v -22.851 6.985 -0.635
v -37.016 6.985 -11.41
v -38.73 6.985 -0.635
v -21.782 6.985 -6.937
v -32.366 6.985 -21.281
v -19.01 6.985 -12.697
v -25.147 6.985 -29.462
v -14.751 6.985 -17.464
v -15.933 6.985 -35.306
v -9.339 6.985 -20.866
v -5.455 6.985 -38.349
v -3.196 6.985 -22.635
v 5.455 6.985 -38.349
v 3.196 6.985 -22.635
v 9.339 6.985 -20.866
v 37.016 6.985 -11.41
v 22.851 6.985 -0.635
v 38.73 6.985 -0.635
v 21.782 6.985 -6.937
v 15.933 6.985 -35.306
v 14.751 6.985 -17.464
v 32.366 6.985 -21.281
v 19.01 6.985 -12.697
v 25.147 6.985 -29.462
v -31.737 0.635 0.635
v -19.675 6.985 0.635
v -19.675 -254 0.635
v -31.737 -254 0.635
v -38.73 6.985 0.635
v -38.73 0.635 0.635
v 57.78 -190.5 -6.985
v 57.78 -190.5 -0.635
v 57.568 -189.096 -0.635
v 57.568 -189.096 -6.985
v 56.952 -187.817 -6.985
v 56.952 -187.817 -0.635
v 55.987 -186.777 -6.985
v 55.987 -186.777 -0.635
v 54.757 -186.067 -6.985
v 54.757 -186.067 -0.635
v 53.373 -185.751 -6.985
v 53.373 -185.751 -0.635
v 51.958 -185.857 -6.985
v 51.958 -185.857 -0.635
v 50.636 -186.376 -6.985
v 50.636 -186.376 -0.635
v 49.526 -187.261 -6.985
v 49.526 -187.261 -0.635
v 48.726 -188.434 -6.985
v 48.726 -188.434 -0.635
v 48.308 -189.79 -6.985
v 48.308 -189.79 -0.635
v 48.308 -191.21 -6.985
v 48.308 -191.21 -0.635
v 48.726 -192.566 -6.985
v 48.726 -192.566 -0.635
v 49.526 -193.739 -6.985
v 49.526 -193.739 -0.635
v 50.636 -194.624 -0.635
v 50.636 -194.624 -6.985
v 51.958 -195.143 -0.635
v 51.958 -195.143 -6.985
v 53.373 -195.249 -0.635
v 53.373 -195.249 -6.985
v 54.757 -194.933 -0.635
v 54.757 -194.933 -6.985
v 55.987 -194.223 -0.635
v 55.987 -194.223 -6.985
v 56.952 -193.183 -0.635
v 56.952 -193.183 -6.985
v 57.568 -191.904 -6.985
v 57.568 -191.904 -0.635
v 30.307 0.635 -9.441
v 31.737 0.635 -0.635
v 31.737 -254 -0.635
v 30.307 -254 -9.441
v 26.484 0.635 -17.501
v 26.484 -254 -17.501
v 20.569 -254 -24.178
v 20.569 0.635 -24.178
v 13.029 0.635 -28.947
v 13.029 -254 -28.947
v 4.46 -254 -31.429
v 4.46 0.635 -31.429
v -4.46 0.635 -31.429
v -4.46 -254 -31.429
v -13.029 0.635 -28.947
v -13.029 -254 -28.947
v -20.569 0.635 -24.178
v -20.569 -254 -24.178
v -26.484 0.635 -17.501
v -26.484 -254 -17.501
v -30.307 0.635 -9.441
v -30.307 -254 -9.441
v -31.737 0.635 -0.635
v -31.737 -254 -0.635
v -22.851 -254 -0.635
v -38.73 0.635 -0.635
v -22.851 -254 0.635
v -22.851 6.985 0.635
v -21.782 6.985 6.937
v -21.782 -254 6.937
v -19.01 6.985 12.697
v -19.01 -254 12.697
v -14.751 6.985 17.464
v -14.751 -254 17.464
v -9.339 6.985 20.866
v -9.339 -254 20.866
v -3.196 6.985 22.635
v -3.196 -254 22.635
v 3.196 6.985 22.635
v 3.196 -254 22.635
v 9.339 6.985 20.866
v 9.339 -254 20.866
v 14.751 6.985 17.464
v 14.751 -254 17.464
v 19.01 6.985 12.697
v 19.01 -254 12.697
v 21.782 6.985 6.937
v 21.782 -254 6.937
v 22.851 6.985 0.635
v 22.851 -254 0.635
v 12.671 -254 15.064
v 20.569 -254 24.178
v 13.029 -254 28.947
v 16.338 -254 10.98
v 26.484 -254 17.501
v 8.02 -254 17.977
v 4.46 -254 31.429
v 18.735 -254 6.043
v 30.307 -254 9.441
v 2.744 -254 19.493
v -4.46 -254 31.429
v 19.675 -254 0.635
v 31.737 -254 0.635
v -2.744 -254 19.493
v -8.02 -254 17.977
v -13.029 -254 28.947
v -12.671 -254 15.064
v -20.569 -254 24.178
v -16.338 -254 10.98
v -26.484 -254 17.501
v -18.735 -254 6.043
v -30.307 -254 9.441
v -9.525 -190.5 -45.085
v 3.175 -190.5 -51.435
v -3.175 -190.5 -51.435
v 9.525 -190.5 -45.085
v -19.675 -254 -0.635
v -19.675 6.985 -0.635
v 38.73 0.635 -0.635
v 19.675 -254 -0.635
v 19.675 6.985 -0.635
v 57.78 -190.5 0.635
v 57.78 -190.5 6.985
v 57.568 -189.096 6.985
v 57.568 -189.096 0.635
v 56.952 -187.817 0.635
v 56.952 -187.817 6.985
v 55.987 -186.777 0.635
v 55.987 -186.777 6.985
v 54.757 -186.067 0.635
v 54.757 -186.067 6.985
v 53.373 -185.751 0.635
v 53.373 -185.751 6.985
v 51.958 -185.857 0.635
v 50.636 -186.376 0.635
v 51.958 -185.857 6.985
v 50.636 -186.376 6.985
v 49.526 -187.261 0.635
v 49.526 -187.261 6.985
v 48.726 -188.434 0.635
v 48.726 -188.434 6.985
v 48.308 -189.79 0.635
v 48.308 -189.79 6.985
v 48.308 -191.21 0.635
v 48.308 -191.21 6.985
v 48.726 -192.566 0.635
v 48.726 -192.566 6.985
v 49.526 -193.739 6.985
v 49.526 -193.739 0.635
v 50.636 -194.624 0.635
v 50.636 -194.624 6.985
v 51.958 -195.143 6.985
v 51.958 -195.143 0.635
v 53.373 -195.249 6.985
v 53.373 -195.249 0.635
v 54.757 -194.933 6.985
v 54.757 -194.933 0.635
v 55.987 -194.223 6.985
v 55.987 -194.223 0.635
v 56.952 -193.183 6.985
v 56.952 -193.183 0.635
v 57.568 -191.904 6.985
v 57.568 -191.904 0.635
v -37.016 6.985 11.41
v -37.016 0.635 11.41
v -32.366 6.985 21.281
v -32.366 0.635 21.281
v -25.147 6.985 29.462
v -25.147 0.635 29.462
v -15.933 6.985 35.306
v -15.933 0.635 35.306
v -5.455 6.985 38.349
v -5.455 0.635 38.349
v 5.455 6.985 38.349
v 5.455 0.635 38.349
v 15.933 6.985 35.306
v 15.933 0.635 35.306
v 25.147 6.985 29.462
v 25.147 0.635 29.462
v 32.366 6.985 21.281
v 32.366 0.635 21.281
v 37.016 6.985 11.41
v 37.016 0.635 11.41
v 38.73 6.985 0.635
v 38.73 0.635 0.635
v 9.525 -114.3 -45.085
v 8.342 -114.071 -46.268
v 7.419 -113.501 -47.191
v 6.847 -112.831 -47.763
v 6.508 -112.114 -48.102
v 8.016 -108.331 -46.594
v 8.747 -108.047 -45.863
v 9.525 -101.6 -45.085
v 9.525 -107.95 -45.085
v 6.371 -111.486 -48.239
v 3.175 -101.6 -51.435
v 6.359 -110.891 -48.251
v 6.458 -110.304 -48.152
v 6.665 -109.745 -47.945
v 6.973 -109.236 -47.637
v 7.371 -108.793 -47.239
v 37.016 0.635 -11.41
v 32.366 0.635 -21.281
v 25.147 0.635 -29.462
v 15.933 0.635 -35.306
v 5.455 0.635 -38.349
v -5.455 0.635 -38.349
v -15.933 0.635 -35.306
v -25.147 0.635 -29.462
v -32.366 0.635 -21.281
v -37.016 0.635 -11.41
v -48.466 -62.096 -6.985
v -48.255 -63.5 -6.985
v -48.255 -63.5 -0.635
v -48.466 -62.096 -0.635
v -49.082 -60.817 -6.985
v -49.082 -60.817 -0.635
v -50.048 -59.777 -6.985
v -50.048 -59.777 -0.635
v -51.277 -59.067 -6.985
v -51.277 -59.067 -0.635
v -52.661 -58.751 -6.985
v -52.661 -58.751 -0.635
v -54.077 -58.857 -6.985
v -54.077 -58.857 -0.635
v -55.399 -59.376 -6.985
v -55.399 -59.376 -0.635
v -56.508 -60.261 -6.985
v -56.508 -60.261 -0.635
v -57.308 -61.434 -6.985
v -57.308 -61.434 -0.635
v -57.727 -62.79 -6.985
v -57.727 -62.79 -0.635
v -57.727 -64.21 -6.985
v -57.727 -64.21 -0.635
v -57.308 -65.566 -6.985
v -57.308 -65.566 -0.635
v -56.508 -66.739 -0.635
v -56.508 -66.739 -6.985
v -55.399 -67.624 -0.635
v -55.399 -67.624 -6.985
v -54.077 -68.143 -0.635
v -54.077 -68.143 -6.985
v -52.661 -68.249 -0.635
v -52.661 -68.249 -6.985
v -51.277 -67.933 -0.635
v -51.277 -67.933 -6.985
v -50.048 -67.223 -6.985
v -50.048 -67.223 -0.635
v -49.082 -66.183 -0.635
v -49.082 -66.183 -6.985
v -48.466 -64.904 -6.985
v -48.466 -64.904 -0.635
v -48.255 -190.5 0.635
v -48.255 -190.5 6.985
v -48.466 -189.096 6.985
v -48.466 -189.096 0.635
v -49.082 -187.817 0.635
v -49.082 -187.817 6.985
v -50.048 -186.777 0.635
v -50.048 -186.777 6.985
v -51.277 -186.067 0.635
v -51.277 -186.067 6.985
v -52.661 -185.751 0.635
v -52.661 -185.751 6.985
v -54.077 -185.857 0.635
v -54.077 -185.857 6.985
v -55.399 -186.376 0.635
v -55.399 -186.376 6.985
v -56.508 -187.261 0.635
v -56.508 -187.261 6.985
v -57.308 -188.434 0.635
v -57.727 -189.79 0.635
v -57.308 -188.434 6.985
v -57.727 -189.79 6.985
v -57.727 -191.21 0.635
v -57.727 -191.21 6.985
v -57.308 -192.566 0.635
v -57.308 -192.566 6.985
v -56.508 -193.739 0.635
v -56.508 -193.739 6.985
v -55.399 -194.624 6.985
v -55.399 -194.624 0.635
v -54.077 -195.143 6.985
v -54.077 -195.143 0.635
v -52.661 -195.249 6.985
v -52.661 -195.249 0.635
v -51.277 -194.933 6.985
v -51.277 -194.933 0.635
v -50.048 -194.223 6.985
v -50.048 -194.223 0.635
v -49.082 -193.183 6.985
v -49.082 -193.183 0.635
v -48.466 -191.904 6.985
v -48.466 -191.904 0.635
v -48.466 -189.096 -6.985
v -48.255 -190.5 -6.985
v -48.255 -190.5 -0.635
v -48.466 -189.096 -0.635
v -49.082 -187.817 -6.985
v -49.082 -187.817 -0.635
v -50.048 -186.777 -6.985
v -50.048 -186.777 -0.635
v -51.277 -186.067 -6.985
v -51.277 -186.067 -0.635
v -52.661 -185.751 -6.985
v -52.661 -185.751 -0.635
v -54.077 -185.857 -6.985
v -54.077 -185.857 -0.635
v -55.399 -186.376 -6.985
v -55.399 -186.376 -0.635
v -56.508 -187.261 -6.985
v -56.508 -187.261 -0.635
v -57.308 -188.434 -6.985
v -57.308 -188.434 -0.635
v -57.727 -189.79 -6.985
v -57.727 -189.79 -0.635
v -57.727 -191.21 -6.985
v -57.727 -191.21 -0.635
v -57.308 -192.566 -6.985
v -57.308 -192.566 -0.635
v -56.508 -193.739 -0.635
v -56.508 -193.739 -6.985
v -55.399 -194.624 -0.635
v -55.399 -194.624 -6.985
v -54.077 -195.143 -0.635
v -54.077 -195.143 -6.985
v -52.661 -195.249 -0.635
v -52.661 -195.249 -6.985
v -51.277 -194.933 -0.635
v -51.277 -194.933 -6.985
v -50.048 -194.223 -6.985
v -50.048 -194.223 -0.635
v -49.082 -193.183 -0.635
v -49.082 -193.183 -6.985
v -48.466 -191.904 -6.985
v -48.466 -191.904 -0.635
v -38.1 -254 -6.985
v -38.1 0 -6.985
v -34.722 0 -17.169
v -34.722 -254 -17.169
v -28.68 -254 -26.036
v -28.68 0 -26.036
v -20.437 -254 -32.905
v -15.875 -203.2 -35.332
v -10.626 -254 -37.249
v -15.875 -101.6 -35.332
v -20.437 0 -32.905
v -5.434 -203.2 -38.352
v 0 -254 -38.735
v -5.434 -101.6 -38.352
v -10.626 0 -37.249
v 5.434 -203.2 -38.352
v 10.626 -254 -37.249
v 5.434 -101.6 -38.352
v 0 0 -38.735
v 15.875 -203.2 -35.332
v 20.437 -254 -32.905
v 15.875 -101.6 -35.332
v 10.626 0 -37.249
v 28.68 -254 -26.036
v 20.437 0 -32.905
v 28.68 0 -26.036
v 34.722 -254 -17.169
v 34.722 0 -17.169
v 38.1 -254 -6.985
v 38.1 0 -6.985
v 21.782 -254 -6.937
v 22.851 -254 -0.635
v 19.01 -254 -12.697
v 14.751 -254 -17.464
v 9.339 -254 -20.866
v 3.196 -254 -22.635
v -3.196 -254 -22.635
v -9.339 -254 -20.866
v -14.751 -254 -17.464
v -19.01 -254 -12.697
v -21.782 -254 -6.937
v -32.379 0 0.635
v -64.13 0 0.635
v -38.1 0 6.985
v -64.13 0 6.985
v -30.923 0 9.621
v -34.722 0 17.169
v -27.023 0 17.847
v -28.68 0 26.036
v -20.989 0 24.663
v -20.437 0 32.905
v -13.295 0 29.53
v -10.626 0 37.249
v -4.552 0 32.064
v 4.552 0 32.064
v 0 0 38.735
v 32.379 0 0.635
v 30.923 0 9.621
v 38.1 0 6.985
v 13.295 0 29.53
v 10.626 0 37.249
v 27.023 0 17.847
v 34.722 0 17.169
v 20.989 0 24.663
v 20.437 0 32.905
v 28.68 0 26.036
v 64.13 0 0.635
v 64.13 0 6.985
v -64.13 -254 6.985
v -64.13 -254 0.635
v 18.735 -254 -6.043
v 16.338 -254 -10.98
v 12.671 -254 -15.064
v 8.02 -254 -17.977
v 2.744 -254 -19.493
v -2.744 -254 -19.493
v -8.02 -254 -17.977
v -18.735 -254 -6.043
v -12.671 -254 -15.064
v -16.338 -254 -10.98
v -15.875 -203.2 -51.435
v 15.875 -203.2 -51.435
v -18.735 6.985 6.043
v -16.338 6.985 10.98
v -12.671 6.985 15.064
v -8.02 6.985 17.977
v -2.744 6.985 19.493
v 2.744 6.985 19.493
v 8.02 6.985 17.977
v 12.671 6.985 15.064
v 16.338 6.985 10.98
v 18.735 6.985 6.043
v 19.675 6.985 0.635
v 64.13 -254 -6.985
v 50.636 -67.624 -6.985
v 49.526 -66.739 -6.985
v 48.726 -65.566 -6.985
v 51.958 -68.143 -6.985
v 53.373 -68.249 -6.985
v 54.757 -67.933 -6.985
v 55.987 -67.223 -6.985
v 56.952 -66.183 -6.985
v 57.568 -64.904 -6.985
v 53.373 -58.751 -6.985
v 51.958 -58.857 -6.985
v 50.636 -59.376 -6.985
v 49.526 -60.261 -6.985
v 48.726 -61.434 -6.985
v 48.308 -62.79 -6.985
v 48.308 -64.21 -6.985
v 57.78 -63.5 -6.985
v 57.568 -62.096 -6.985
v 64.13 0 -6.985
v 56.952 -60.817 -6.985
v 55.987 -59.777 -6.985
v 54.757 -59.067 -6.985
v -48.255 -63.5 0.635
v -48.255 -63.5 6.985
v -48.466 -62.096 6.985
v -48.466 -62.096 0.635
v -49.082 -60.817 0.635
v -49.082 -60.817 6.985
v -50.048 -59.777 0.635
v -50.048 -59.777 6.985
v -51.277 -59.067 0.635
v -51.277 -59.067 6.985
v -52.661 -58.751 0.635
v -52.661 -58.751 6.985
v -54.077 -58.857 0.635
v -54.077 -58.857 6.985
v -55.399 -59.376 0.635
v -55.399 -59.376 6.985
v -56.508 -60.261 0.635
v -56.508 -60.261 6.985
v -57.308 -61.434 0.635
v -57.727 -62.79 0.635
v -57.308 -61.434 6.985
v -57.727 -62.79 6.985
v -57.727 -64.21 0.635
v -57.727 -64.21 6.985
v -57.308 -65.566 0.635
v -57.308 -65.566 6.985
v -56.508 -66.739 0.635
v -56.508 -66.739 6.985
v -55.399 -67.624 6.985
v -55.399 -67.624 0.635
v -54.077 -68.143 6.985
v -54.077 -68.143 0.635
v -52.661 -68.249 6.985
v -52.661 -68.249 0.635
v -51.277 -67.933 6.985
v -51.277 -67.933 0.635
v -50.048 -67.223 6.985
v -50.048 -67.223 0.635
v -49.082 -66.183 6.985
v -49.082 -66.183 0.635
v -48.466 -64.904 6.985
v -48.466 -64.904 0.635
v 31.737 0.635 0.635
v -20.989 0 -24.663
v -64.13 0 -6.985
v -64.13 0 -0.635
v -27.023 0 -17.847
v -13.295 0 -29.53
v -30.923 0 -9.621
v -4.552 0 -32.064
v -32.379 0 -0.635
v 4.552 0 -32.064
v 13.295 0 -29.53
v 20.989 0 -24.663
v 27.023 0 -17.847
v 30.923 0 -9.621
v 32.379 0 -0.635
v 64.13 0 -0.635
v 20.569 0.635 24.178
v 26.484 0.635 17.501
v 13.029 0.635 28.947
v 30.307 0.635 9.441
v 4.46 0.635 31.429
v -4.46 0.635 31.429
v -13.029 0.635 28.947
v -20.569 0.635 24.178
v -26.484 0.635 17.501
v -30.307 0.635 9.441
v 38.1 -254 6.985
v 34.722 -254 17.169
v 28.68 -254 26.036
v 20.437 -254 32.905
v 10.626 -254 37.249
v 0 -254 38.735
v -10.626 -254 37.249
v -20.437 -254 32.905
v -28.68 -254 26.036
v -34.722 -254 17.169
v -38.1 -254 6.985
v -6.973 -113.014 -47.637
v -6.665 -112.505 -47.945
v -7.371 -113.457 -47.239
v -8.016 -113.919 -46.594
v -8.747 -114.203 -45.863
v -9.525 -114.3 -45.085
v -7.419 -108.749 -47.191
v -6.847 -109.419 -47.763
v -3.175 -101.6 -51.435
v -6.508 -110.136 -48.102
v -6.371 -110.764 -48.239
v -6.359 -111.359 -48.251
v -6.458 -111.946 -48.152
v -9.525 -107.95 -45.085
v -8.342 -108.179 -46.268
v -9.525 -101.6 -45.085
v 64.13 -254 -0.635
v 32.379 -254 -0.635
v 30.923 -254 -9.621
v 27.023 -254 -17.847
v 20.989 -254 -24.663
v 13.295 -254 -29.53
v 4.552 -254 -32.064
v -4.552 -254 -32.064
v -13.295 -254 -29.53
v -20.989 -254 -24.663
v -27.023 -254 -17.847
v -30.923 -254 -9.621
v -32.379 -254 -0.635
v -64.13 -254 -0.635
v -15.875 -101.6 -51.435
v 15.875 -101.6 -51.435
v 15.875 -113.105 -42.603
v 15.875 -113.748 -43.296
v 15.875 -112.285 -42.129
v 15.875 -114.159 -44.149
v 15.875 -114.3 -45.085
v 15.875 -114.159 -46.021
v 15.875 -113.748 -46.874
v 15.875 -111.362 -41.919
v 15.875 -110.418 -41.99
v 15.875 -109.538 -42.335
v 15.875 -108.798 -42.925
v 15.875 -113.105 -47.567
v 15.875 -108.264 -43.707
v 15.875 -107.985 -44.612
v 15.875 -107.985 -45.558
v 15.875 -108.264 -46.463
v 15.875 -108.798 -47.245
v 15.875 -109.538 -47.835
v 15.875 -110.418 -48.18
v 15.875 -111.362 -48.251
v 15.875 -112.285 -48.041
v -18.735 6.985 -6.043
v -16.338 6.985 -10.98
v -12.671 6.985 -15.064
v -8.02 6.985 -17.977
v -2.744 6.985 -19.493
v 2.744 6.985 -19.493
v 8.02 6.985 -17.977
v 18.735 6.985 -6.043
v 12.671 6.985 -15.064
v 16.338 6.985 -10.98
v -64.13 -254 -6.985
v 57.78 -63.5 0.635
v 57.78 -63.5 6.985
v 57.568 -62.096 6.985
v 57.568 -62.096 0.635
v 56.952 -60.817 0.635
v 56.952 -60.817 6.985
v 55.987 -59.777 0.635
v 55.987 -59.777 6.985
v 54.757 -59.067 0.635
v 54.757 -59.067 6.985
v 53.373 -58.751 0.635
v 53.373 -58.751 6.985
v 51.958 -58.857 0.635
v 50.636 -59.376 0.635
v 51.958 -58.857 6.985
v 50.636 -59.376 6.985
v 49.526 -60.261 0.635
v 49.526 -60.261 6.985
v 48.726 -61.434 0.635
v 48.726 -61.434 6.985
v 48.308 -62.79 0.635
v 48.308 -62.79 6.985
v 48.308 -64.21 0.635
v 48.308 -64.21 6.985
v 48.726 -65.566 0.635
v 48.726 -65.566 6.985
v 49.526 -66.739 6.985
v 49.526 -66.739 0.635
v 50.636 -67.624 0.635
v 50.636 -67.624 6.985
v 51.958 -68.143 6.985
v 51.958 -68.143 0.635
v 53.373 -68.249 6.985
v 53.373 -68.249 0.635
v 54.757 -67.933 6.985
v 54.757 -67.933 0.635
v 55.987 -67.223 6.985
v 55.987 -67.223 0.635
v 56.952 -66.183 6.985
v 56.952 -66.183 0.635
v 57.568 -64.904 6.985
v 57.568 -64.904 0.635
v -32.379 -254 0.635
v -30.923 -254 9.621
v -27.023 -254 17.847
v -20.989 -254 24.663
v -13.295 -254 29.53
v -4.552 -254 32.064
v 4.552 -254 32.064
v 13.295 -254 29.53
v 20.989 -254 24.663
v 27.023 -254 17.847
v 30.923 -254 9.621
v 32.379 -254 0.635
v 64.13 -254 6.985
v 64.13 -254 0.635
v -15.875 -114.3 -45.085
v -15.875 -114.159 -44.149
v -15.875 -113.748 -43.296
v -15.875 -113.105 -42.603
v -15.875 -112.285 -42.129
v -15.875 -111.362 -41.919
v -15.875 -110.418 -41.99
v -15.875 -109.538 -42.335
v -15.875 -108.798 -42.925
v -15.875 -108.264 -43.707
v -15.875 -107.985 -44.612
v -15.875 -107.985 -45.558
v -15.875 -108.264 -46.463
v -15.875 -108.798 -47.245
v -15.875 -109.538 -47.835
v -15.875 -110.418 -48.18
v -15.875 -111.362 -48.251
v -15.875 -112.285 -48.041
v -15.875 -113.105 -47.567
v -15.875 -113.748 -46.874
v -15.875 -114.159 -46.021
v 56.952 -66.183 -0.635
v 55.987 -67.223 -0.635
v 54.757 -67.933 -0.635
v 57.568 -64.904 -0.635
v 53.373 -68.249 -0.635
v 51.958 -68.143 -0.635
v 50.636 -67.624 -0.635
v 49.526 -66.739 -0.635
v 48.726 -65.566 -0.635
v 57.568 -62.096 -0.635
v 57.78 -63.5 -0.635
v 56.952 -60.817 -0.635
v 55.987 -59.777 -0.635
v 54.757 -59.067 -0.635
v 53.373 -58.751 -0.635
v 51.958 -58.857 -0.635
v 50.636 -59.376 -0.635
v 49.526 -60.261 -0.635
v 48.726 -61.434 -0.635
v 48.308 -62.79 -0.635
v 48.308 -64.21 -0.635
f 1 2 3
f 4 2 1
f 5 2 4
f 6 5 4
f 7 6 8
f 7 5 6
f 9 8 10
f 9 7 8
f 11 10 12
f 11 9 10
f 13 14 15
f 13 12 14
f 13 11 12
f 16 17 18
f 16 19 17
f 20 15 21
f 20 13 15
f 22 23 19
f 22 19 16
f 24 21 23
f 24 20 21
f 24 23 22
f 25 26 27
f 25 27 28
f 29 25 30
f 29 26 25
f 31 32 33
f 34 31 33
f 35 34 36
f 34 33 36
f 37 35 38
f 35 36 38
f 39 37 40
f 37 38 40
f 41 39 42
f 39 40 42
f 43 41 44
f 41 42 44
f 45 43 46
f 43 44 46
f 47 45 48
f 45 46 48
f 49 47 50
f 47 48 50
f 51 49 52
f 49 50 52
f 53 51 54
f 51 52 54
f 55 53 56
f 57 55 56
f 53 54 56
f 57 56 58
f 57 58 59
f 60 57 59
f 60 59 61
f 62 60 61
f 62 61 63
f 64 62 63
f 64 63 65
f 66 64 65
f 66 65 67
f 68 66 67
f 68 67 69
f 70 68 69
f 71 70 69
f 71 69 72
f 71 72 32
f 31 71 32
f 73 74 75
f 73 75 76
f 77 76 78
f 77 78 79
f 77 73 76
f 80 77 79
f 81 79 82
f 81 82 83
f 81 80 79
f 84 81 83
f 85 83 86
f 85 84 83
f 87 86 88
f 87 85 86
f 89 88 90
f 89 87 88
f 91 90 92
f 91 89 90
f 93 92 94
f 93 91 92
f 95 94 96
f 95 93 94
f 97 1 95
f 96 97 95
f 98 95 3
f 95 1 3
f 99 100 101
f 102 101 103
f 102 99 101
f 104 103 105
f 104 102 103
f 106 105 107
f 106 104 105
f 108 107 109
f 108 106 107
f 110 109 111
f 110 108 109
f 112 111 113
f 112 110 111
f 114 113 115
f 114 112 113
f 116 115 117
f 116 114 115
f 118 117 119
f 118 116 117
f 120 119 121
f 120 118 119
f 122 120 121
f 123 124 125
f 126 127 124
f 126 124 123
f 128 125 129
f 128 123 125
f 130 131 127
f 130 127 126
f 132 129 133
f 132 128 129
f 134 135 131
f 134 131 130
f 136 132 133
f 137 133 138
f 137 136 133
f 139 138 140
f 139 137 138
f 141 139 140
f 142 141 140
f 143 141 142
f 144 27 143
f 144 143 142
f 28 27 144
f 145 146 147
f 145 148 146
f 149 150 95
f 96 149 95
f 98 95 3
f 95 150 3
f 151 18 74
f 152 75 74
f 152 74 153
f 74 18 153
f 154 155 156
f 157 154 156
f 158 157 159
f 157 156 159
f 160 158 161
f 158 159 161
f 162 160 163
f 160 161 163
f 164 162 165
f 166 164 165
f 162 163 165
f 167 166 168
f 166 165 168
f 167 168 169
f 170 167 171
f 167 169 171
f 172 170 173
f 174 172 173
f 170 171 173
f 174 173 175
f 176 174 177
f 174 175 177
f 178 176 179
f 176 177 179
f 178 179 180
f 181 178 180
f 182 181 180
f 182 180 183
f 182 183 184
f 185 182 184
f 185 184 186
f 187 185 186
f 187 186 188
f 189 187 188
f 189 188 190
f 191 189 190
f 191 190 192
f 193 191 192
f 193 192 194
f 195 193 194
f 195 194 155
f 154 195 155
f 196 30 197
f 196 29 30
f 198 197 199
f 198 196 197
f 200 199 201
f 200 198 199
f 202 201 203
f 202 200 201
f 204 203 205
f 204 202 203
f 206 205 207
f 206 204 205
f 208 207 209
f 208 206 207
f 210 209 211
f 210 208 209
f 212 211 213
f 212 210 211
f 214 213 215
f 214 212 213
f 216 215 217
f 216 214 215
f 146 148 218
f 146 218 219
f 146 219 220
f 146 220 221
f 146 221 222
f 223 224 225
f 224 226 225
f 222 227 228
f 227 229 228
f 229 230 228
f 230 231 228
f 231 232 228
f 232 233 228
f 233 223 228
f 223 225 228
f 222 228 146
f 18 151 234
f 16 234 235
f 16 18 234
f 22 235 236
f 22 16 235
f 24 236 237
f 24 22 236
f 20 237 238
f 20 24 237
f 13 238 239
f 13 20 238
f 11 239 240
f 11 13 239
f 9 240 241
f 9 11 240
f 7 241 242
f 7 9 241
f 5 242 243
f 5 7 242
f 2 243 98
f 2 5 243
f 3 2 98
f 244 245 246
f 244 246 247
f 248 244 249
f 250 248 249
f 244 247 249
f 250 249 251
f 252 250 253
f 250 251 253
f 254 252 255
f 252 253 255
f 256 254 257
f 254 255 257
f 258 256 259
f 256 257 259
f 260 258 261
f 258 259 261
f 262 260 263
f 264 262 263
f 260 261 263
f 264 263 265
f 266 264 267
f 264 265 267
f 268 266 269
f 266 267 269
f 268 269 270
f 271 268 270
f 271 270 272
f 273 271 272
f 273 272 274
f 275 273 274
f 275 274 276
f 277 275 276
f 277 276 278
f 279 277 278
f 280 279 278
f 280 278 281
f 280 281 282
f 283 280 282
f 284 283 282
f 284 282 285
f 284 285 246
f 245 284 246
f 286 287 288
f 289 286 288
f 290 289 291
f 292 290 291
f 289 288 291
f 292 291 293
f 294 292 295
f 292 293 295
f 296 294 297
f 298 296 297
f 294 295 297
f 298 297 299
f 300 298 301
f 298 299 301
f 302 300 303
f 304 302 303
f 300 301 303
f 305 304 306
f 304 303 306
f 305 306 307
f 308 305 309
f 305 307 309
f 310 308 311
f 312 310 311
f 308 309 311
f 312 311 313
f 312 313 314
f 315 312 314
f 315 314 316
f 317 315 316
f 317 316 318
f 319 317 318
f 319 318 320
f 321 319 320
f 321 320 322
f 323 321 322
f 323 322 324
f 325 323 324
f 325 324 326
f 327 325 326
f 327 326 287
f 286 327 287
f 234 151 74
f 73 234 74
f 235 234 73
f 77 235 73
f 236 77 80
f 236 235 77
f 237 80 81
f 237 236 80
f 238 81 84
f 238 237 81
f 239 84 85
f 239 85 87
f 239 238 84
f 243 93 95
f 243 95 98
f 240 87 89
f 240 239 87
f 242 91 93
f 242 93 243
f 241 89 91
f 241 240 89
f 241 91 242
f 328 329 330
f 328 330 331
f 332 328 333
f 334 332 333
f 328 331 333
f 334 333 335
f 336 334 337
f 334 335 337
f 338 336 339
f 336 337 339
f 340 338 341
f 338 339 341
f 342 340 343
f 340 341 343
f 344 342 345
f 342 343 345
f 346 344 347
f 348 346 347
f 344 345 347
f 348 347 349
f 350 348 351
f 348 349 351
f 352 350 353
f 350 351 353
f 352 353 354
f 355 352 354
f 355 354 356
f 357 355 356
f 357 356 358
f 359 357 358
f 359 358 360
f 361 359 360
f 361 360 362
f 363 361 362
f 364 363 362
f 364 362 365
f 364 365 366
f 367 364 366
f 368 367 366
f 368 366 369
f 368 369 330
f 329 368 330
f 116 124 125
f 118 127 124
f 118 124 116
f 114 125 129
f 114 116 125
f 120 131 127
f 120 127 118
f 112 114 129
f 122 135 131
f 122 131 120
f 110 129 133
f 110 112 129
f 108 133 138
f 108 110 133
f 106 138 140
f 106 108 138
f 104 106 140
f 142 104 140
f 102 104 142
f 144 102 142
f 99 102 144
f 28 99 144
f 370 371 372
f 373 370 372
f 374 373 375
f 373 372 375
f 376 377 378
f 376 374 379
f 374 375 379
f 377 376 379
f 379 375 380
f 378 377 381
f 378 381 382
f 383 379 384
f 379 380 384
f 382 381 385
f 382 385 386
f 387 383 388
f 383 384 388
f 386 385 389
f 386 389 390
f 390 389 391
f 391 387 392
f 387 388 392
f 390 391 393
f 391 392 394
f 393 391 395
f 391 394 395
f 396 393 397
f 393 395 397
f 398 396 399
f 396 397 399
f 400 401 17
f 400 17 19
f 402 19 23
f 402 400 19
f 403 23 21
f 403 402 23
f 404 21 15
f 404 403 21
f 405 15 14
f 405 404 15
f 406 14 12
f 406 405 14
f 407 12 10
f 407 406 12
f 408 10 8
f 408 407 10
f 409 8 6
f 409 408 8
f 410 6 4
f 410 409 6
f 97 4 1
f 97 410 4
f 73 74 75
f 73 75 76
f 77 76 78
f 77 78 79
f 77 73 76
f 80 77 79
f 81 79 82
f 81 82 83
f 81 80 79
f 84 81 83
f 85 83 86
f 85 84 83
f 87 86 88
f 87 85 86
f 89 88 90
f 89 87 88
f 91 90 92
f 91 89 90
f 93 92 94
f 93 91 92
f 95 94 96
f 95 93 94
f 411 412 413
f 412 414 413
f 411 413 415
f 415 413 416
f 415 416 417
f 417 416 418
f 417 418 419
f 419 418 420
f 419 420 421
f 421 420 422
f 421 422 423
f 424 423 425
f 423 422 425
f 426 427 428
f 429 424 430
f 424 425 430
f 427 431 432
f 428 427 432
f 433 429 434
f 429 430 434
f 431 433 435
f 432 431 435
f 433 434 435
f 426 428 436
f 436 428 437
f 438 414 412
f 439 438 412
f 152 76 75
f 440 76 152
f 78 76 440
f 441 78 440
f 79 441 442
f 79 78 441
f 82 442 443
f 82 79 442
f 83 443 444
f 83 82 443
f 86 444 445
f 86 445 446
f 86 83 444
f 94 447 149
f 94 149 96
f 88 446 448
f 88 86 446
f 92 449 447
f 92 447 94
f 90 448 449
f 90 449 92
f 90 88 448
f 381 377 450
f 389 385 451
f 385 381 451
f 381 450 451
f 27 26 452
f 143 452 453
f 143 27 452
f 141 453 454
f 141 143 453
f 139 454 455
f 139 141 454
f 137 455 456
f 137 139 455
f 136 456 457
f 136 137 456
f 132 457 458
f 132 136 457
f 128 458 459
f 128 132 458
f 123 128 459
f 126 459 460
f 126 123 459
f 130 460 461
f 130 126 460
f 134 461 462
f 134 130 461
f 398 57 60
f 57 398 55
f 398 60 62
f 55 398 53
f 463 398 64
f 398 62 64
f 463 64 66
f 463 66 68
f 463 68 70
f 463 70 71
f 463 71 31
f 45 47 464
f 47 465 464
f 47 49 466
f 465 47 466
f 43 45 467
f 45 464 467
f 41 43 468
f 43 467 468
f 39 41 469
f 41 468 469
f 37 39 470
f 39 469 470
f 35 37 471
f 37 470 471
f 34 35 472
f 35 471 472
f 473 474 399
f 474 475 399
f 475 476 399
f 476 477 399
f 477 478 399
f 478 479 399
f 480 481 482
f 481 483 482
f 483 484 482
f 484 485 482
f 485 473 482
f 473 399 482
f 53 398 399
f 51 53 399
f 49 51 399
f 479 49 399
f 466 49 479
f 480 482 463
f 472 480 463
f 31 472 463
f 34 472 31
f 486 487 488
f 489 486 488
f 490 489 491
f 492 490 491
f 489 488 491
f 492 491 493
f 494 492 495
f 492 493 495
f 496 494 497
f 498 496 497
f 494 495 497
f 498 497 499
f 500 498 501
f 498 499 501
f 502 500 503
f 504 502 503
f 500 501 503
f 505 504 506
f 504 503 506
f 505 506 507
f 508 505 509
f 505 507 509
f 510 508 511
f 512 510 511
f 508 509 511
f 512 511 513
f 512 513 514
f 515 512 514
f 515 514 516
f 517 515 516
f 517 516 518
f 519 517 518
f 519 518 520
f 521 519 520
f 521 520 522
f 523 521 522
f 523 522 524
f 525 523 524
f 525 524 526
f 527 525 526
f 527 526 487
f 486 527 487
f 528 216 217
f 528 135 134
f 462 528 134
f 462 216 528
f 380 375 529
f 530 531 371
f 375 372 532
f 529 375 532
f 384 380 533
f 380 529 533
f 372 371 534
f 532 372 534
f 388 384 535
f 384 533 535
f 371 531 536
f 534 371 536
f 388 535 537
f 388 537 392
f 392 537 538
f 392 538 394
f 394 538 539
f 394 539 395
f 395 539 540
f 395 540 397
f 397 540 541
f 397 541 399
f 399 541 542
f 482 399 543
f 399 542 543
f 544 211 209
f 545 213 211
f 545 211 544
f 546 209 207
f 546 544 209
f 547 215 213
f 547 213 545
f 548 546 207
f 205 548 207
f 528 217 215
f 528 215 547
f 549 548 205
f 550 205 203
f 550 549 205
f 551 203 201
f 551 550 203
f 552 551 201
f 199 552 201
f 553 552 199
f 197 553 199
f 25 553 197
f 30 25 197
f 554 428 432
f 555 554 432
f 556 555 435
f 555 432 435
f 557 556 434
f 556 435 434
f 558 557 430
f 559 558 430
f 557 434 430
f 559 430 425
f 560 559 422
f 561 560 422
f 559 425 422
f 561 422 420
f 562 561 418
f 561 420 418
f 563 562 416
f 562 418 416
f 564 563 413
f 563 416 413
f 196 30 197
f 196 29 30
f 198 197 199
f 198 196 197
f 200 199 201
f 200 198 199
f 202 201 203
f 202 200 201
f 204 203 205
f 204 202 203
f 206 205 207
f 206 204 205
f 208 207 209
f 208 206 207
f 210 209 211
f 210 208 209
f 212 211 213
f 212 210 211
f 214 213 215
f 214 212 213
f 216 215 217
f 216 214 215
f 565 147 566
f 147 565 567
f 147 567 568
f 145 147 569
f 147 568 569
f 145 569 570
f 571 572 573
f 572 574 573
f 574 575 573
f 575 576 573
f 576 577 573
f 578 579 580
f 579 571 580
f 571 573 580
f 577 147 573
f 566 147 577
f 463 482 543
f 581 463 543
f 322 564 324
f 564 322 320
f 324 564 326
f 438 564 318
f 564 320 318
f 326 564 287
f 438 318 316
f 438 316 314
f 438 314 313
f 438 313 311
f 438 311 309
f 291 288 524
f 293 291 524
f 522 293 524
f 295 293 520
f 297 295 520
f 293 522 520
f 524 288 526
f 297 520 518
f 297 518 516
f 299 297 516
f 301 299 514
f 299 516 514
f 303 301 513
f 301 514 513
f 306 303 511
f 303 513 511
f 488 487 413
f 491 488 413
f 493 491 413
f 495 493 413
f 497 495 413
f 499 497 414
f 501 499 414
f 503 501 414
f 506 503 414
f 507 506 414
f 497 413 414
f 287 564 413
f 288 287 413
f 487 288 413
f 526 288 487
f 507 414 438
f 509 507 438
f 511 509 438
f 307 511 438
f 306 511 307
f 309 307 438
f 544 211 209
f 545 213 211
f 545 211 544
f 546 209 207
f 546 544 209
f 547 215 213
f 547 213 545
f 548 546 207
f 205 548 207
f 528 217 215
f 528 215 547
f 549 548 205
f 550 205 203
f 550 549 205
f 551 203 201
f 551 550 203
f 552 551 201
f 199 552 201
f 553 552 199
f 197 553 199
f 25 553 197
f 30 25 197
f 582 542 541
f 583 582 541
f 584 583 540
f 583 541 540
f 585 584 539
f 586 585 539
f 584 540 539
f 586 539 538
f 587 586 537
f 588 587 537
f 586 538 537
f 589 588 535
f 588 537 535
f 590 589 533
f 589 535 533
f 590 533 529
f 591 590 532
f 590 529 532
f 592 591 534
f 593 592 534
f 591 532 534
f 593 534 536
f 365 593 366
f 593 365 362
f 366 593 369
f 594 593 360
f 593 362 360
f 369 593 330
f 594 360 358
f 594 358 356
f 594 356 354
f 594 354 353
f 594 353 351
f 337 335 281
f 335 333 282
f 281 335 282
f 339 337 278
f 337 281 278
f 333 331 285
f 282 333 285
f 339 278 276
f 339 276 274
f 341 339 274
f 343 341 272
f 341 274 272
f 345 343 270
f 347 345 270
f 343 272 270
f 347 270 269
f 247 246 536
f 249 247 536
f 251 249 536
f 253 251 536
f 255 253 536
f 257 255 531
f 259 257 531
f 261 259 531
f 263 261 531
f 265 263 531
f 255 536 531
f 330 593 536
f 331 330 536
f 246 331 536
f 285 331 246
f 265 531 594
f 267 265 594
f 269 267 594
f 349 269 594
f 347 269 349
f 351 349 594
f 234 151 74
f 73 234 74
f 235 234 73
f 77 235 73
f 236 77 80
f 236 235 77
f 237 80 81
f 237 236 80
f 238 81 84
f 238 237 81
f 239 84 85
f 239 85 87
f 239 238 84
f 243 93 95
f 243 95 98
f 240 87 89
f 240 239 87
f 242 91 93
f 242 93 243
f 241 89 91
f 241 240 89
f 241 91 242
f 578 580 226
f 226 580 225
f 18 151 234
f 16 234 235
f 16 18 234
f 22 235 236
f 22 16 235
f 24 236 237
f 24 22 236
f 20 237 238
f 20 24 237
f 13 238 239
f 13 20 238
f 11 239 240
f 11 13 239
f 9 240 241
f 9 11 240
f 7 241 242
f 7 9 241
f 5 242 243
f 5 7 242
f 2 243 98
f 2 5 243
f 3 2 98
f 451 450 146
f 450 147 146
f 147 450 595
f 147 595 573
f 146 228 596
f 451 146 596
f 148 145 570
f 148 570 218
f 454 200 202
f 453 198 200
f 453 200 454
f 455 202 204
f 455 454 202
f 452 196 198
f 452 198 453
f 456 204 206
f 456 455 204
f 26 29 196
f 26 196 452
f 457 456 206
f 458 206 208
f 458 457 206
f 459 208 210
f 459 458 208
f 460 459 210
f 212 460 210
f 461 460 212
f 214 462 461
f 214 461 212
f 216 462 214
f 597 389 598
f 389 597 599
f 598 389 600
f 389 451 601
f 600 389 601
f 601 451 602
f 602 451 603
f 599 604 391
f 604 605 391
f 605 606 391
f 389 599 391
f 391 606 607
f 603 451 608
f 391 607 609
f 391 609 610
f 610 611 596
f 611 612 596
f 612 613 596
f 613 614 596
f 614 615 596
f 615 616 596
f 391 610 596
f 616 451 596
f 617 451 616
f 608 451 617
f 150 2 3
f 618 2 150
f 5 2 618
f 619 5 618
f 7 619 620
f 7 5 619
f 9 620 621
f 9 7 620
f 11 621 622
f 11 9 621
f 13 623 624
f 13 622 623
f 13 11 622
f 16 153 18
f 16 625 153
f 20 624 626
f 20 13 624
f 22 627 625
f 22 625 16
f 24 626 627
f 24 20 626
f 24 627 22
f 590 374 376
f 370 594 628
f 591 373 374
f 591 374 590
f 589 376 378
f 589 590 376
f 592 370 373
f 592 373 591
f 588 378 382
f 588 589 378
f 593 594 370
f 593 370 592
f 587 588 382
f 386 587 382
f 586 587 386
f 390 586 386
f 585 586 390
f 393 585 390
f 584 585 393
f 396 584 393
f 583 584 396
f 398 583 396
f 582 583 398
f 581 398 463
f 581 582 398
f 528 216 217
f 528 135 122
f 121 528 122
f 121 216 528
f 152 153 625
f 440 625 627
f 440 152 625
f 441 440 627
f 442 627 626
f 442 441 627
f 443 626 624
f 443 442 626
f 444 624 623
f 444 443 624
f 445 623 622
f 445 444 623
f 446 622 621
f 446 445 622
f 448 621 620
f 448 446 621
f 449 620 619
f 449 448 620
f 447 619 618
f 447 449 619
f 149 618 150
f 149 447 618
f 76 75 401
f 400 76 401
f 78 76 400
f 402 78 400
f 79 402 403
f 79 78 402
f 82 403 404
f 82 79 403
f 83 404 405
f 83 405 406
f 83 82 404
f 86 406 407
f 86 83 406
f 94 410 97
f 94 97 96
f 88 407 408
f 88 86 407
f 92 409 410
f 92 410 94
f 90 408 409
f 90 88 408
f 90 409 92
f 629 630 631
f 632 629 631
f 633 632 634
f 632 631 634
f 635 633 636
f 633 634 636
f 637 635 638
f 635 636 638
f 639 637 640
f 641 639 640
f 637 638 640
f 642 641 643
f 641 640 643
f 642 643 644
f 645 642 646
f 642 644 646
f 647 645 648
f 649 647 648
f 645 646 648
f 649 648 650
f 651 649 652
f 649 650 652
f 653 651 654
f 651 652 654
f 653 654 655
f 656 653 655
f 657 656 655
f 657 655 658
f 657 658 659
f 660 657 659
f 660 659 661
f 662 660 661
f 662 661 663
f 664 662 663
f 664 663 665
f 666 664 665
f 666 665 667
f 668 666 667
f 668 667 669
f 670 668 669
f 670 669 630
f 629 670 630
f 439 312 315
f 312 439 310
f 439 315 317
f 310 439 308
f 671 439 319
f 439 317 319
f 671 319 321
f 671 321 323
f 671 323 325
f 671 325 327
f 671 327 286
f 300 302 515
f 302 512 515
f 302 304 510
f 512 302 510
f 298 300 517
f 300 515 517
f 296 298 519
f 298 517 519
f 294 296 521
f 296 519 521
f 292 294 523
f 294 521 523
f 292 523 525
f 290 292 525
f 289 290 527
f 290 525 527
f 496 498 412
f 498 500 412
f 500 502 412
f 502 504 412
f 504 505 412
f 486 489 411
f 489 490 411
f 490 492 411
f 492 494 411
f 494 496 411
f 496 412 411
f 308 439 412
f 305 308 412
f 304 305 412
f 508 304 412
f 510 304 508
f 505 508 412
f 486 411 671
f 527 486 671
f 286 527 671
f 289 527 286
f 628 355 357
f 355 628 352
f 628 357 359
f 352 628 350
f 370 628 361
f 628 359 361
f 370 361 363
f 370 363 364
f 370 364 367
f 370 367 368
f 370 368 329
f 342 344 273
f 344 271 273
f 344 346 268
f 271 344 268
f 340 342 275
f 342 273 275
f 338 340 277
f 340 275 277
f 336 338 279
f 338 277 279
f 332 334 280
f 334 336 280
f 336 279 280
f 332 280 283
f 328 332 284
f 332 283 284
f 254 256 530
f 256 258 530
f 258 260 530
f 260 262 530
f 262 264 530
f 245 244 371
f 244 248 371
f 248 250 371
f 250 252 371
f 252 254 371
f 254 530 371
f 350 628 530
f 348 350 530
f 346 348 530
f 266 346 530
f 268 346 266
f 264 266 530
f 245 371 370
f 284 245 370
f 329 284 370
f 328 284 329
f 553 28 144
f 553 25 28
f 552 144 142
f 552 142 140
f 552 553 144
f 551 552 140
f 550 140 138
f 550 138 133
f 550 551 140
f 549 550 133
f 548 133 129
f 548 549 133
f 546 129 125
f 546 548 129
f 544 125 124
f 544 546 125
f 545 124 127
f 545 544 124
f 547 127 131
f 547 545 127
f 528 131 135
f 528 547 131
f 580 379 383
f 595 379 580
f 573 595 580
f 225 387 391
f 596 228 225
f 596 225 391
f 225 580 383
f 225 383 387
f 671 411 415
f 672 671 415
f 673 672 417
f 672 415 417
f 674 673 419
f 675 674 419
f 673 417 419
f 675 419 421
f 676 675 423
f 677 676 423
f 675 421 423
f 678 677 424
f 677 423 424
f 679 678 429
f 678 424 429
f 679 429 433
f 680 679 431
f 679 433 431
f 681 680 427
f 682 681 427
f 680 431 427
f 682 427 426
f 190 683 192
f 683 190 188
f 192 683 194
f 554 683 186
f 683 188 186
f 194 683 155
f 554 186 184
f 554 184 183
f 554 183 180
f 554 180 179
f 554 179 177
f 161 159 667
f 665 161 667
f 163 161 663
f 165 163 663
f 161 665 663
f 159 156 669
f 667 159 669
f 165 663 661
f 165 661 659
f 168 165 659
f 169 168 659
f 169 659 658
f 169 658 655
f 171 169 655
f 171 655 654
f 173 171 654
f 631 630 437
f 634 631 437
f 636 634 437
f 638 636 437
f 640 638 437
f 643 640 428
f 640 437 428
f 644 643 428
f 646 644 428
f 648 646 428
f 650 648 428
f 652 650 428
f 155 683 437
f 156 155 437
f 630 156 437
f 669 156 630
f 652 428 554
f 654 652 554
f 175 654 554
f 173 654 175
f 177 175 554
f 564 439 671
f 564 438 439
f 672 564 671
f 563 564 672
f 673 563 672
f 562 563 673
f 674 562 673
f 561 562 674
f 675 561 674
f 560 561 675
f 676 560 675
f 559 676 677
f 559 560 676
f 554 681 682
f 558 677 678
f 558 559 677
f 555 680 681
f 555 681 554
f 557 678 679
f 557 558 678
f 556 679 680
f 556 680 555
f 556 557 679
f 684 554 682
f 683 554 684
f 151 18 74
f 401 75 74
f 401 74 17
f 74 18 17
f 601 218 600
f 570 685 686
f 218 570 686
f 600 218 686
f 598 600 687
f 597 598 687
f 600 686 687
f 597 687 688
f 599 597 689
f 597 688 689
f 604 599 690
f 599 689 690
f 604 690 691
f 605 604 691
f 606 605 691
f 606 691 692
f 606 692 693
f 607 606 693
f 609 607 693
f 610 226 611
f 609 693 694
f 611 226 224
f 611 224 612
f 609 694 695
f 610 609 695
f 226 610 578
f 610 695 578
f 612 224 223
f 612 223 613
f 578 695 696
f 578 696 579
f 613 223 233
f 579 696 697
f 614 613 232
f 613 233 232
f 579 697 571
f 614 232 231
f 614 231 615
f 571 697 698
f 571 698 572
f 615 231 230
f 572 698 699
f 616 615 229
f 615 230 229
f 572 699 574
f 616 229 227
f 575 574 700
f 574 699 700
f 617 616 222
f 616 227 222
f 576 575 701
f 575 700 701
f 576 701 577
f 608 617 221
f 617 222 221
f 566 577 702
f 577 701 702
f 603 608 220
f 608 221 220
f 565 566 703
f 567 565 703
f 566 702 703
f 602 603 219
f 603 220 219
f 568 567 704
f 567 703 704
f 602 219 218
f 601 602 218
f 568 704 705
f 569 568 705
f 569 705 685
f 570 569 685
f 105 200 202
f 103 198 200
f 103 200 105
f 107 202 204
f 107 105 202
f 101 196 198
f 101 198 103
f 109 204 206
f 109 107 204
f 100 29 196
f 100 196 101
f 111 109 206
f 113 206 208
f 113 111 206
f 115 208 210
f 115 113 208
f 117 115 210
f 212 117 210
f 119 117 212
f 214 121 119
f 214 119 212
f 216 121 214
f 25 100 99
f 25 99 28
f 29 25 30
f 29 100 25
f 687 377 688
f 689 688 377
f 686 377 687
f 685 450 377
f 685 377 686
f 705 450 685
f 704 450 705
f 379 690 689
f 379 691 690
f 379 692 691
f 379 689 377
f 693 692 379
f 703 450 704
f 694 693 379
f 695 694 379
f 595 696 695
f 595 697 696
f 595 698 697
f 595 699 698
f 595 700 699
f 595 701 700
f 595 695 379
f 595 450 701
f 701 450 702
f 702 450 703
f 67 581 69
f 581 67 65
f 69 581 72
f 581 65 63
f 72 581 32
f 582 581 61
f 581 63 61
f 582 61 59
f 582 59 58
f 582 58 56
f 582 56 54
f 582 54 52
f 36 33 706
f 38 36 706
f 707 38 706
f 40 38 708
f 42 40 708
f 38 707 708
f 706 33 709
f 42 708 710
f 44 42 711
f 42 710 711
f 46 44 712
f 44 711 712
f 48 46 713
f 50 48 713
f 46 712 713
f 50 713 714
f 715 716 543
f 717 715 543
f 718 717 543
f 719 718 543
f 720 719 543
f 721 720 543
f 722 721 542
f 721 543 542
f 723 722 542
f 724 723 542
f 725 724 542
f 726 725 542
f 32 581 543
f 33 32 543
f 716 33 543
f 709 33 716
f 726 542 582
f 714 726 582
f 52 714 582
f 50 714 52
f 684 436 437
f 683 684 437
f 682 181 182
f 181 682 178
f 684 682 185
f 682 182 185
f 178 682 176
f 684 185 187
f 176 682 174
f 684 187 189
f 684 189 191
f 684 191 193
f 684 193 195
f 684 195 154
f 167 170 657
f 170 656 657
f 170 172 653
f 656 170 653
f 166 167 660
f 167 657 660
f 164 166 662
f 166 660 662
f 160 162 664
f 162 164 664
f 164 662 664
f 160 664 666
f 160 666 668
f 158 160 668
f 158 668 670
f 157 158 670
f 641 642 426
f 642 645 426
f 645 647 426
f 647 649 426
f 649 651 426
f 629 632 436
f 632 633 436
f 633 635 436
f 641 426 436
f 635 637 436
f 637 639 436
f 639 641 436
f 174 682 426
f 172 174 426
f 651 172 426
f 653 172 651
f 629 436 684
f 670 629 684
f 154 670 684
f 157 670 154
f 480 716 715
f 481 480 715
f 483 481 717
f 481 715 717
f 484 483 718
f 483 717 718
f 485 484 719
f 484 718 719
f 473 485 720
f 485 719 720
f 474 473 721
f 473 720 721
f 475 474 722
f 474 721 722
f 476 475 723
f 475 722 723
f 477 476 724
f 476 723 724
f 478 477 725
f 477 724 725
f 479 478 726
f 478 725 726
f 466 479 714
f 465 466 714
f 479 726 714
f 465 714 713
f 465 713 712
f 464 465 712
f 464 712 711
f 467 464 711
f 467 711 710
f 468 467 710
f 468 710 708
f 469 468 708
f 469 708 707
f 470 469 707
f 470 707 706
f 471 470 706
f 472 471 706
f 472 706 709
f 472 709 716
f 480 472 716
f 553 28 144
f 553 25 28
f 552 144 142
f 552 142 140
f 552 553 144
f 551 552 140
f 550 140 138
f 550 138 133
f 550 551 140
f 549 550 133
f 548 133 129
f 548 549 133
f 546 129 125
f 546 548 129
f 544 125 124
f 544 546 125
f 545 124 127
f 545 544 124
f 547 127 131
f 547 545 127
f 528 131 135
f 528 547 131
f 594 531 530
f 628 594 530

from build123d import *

# Parameters (mm, degrees)
F1_DEPTH  = 254
F3_W      = 31.75
F3_H      = 101.6
F6_DEPTH  = 88.9
F7_R      = 3.175
F8_DEPTH  = 80.0057947322
F9_R      = 4.7625
F10_DEPTH = 58.421
F15_W     = 128.2595894644
F15_H     = 1.27
F16_DEPTH = 260.986
F17_W     = 128.2595894644
F17_H     = 1.27
F18_DEPTH = 260.986


with BuildPart() as f1:
    # F0 (on Front) → F1 (new body)
    with BuildSketch(Plane.XZ):
        with BuildLine():
            ThreePointArc((32.3787739113, -0.635), (0, -32.385), (-32.3787739113, -0.635))
            Line((-32.3787739113, -0.635), (-38.7297947322, -0.635))
            Line((-38.7297947322, -0.635), (-64.1297947322, -0.635))
            Line((-64.1297947322, -0.635), (-64.1297947322, -6.985))
            Line((-64.1297947322, -6.985), (-38.1, -6.985))
            ThreePointArc((-38.1, -6.985), (0, -38.735), (38.1, -6.985))
            Line((38.1, -6.985), (64.1297947322, -6.985))
            Line((64.1297947322, -6.985), (64.1297947322, -0.635))
            Line((64.1297947322, -0.635), (38.7297947322, -0.635))
            Line((38.7297947322, -0.635), (32.3787739113, -0.635))
        make_face()
    extrude(amount=F1_DEPTH)

    # F3 (on offset) → F4 (join, up to the next surface of F1)
    with BuildSketch(Plane.XY.offset(-51.435)):
        with Locations((0, -152.4)):
            Rectangle(F3_W, F3_H)
    extrude(until=Until.NEXT)

    # F5 (on face) → F6 (cut)
    with BuildSketch(Plane(origin=(0, -101.6, 0), x_dir=(-1, 0, 0), z_dir=(0, 1, 0))):
        Polygon((-3.175, -51.435), (0, -51.435), (3.175, -51.435), (9.525, -45.085), (0, -45.085), (-9.525, -45.085), align=None)
    extrude(amount=-F6_DEPTH, mode=Mode.SUBTRACT)

    # F7 (on face) → F8 (cut, through all)
    with BuildSketch(Plane(origin=(-15.875, 0, 0), x_dir=(0, -1, 0), z_dir=(-1, 0, 0))):
        with Locations((111.125, -45.085)):
            Circle(F7_R)
    extrude(amount=-F8_DEPTH, mode=Mode.SUBTRACT)


with BuildPart() as f1b:
    # F0 (on Front) → F1, piece 2 (new body)
    with BuildSketch(Plane.XZ):
        with BuildLine():
            Line((-64.1297947322, 0.635), (-38.7297947322, 0.635))
            Line((-38.7297947322, 0.635), (-32.3787739113, 0.635))
            ThreePointArc((-32.3787739113, 0.635), (0, 32.385), (32.3787739113, 0.635))
            Line((32.3787739113, 0.635), (38.7297947322, 0.635))
            Line((38.7297947322, 0.635), (64.1297947322, 0.635))
            Line((64.1297947322, 0.635), (64.1297947322, 6.985))
            Line((64.1297947322, 6.985), (38.1, 6.985))
            ThreePointArc((38.1, 6.985), (0, 38.735), (-38.1, 6.985))
            Line((-38.1, 6.985), (-64.1297947322, 6.985))
            Line((-64.1297947322, 6.985), (-64.1297947322, 0.635))
        make_face()
    extrude(amount=F1_DEPTH)


with BuildPart() as f10_tool:
    # F9 (on face) → F10 (new body, through all)
    with BuildSketch(Plane.XY.offset(6.985)):
        with Locations((53.0172947322, -190.5)):
            Circle(F9_R)
        with Locations((53.0172947322, -63.5)):
            Circle(F9_R)
        with Locations((-53.0172947322, -190.5)):
            Circle(F9_R)
        with Locations((-53.0172947322, -63.5)):
            Circle(F9_R)
    extrude(amount=-F10_DEPTH)


with BuildPart() as f1_1:
    add(f1.part)

    # F10: cut by f10_tool
    add(f10_tool.part, mode=Mode.SUBTRACT)

    # F17 (on face) → F18 (cut, through all)
    with BuildSketch(Plane(origin=(0, 6.985, 0), x_dir=(-1, 0, 0), z_dir=(0, 1, 0))):
        Rectangle(F17_W, F17_H)
    extrude(amount=-F18_DEPTH, mode=Mode.SUBTRACT)


with BuildPart() as f1b_1:
    add(f1b.part)

    # F10: cut by f10_tool
    add(f10_tool.part, mode=Mode.SUBTRACT)


with BuildPart() as f12:
    # F11 (on Top) → F12 (revolve)
    with BuildSketch(Plane.XY):
        Polygon((38.735, 6.985), (22.86, 6.985), (22.86, -123.5075), (22.86, -254), (31.7437739113, -254), (31.7437739113, -123.5075), (31.7437739113, 0.635), (38.735, 0.635), align=None)
    revolve(axis=Axis((0, -123.5075, 0), (0, 1, 0)))


with BuildPart() as f14:
    # F13 (on Top) → F14 (revolve)
    with BuildSketch(Plane.XY):
        Polygon((38.735, 6.985), (19.685, 6.985), (19.685, -254), (31.7437739113, -254), (31.7437739113, 0.635), (38.735, 0.635), align=None)
    revolve(axis=Axis((0, -123.5075, 0), (0, 1, 0)))


with BuildPart() as f16_tool:
    # F15 (on face) → F16 (new body, through all)
    with BuildSketch(Plane(origin=(0, 6.985, 0), x_dir=(-1, 0, 0), z_dir=(0, 1, 0))):
        Rectangle(F15_W, F15_H)
    extrude(amount=-F16_DEPTH)


with BuildPart() as f12_1:
    add(f12.part)

    # F16: cut by f16_tool
    add(f16_tool.part, mode=Mode.SUBTRACT)


with BuildPart() as f14_1:
    add(f14.part)

    # F16: cut by f16_tool
    add(f16_tool.part, mode=Mode.SUBTRACT)


solid = Compound([f1_1.part, f1b_1.part, f12_1.part, f14_1.part])
